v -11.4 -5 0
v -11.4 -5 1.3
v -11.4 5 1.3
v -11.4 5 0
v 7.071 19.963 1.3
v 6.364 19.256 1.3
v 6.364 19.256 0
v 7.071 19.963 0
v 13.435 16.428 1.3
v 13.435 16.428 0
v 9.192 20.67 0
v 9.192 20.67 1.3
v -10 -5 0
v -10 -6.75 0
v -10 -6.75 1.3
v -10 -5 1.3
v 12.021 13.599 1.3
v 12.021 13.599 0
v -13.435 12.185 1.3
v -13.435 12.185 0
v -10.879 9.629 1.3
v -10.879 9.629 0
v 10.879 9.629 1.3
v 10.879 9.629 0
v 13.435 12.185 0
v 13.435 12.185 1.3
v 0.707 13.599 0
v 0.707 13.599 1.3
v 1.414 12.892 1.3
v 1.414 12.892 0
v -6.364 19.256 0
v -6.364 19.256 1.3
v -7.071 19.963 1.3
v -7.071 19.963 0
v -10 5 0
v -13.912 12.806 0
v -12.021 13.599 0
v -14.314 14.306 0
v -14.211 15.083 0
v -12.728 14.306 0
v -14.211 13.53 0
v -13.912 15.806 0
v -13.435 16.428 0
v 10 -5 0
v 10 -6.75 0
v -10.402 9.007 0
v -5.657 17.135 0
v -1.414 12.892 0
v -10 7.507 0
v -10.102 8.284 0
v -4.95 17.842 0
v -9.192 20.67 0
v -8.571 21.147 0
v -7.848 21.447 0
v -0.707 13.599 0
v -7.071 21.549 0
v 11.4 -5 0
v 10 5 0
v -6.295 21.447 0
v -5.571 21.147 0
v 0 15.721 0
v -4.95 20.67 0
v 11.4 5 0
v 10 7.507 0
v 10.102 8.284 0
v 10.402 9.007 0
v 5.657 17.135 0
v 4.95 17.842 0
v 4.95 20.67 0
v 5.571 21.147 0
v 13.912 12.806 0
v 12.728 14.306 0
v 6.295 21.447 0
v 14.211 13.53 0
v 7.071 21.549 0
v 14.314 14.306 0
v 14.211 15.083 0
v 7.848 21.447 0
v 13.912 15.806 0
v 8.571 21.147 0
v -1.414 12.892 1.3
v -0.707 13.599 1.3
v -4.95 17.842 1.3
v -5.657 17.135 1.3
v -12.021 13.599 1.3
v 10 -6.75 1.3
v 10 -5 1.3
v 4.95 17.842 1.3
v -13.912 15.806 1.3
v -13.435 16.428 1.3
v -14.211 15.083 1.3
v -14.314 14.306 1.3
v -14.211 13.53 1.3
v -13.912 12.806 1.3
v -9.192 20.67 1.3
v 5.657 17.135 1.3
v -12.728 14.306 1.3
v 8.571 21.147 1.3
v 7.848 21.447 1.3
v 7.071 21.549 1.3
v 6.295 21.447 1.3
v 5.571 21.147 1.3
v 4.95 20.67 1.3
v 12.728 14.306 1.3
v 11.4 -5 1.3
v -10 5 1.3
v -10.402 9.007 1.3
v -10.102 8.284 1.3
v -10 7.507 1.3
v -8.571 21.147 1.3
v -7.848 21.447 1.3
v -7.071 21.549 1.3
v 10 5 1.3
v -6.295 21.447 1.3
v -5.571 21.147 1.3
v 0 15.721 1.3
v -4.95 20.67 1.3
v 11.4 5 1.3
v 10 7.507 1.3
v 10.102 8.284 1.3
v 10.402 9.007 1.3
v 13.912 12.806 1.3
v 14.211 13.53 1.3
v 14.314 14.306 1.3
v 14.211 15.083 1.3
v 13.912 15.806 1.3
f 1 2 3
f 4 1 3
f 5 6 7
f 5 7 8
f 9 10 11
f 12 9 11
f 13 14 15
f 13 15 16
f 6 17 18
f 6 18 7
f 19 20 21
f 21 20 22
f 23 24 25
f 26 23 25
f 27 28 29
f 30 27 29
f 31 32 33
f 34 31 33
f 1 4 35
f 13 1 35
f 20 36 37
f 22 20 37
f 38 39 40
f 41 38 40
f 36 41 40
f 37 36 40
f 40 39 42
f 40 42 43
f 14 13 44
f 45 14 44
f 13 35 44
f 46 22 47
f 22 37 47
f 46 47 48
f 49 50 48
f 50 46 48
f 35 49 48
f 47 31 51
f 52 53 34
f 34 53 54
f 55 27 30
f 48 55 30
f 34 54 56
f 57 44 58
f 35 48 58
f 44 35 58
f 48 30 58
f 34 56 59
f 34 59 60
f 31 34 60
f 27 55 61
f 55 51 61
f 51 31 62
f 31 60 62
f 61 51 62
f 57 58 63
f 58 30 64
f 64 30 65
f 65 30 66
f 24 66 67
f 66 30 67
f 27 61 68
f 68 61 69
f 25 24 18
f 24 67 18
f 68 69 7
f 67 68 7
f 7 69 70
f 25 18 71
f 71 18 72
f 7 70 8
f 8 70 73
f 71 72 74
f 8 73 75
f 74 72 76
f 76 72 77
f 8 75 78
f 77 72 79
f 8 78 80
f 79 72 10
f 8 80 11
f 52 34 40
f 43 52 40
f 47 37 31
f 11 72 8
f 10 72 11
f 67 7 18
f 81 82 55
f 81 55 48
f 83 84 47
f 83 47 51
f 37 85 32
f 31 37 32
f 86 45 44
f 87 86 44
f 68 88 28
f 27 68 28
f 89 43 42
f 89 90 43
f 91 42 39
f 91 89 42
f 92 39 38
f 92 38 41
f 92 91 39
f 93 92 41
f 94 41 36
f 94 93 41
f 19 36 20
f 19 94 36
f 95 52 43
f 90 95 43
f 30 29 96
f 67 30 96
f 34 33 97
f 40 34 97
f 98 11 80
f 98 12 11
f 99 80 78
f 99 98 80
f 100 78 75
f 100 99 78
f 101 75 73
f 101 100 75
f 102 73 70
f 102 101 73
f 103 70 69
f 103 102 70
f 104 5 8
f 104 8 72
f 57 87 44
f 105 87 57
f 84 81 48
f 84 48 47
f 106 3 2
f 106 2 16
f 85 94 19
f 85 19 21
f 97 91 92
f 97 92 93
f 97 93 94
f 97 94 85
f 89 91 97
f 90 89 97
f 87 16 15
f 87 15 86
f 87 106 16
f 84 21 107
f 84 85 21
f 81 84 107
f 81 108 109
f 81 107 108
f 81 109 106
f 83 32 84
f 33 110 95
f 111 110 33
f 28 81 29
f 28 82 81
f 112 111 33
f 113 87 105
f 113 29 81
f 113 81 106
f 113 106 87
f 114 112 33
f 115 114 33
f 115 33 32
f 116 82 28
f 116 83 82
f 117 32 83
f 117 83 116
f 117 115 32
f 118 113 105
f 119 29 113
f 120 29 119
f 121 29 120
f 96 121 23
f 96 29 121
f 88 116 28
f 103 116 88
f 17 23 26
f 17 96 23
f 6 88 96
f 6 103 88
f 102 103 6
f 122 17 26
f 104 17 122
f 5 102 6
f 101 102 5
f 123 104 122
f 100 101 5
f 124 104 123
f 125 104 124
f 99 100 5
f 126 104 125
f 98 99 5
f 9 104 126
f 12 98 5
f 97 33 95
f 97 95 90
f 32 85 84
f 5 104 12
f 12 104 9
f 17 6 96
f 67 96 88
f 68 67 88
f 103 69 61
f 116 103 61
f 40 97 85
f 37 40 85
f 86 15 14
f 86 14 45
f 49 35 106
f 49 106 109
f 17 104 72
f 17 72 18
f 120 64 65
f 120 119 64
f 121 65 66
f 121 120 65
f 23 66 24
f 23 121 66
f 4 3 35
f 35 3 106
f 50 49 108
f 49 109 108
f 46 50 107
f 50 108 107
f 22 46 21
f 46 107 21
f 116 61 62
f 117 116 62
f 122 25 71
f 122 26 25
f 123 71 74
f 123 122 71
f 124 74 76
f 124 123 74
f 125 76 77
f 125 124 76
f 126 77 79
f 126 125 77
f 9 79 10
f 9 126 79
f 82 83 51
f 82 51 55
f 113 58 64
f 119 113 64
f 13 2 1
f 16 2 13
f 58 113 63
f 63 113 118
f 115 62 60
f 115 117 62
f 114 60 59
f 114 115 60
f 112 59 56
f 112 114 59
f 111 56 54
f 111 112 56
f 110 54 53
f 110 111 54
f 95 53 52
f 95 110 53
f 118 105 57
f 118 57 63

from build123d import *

# Parameters (mm, degrees)
BOSS_EXTRUDE1_DEPTH = 1.3
FILLET1_R           = 3
CUT_EXTRUDE1_DEPTH  = 26.902339963
SKETCH2_3_W         = 1.4
SKETCH2_3_H         = 10
BOSS_EXTRUDE2_DEPTH = 1.3
SKETCH3_W           = 20
SKETCH3_H           = 2
CUT_EXTRUDE2_DEPTH  = 26.902339963
CUT_EXTRUDE3_DEPTH  = 26.902339963


with BuildPart() as part:
    # Sketch1 → Boss-Extrude1 (new body)
    with BuildSketch(Plane.XY):
        Polygon((-15.556349186, 14.306349186), (-10, 8.75), (-10, -8.75), (10, -8.75), (10, 8.75), (15.556349186, 14.306349186), (7.071067812, 22.79163056), (0, 15.720562748), (-7.071067812, 22.79163056), align=None)
    extrude(amount=BOSS_EXTRUDE1_DEPTH)

    # Fillet1
    fillet1_edges = [part.edges().sort_by_distance(p)[0] for p in [
        (-10, 8.75, 0.65),
        (10, 8.75, 0.65),
        (-15.556349186, 14.306349186, 0.65),
        (-7.071067812, 22.79163056, 0.65),
        (7.071067812, 22.79163056, 0.65),
        (15.556349186, 14.306349186, 0.65),
    ]]
    fillet(fillet1_edges, radius=FILLET1_R)

    # Sketch2 → Cut-Extrude1 (cut, through all)
    with BuildSketch(Plane.XY.offset(1.3)):
        Polygon((7.071067812, 19.963203436), (12.727922061, 14.306349186), (12.02081528, 13.599242405), (6.363961031, 19.256096654), align=None)
        Polygon((-12.727922061, 14.306349186), (-12.02081528, 13.599242405), (-6.363961031, 19.256096654), (-7.071067812, 19.963203436), align=None)
    extrude(amount=-CUT_EXTRUDE1_DEPTH, mode=Mode.SUBTRACT)

    # Sketch2<3> → Boss-Extrude2 (add)
    with BuildSketch(Plane.XY.offset(1.3)):
        with Locations((-10.7, 0)):
            Rectangle(SKETCH2_3_W, SKETCH2_3_H)
        with Locations((10.7, 0)):
            Rectangle(SKETCH2_3_W, SKETCH2_3_H)
    extrude(amount=-BOSS_EXTRUDE2_DEPTH)

    # Sketch3 → Cut-Extrude2 (cut, through all)
    with BuildSketch(Plane.XY.offset(1.3)):
        with Locations((0, -7.75)):
            Rectangle(SKETCH3_W, SKETCH3_H)
    extrude(amount=-CUT_EXTRUDE2_DEPTH, mode=Mode.SUBTRACT)

    # Sketch4 → Cut-Extrude3 (cut, through all)
    with BuildSketch(Plane.XY.offset(1.3)):
        Polygon((-4.949747468, 17.841883092), (-0.707106781, 13.599242405), (-1.414213562, 12.892135624), (-5.656854249, 17.134776311), align=None)
        Polygon((1.414213562, 12.892135624), (5.656854249, 17.134776311), (4.949747468, 17.841883092), (0.707106781, 13.599242405), align=None)
    extrude(amount=-CUT_EXTRUDE3_DEPTH, mode=Mode.SUBTRACT)


solid = part.part
